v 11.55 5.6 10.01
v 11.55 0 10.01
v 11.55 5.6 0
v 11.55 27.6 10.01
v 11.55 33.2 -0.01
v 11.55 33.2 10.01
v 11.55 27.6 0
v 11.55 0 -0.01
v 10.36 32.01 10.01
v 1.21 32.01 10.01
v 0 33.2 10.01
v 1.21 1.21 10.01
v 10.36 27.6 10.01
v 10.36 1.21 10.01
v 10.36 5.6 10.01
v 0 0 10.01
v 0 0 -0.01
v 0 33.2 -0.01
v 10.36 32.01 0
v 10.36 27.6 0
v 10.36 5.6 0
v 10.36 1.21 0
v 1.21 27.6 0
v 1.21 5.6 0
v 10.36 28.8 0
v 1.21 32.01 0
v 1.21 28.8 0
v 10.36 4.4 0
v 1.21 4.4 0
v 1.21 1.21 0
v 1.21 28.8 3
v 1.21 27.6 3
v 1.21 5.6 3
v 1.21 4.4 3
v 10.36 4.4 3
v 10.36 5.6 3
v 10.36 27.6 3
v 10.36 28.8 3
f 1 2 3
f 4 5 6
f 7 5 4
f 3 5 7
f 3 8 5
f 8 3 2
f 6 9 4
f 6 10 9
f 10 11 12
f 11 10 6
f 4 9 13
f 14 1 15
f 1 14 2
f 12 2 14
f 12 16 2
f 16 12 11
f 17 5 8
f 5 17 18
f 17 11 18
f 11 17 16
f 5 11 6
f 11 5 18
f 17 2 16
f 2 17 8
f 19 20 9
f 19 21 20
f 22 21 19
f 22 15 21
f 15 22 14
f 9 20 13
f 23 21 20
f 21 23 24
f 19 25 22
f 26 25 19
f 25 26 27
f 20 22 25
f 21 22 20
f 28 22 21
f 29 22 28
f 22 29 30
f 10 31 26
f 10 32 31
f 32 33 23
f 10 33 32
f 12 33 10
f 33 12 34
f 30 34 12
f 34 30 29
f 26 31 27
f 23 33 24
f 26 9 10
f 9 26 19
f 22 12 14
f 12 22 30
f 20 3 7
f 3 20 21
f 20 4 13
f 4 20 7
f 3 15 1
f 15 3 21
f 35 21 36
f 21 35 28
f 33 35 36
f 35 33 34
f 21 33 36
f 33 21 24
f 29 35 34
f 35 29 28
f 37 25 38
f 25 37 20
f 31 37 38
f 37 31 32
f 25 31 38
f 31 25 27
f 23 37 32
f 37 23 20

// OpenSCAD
// file: ../Base/Rotation.scad
// Fischertechnik Box Foundation
// Geometry Helpers Rotation

include <PlacementOptions.scad>

// getRotatedSpace(space, rotation=NoRotation)
// Rotates the space dependent on the specified rotation

function getRotatedSpace(space, rotation=NoRotation) = [
    (rotation == Rotate90 || rotation == Rotate270) ? space.y : space.x,
    (rotation == Rotate90 || rotation == Rotate270) ? space.x : space.y
];

// Rotates the given space around the fixed left lower corner
// space = the space the children needs as width/depth list [width,depth]
// rotation = 0 Rotate0 degrees, 1 Rotate90 degrees, 2 Rotate180 degrees, 3 Rotate270 degrees (equivalent to -90)

module RotateFix(space, rotation=NoRotation) {
    dy = (rotation == Rotate0 || rotation == Rotate270) ? 0 :
        (rotation == Rotate90) ? space.x :
        space.y;
    dx = (rotation < Rotate180) ? 0 :
        (rotation == Rotate180) ? space.x :
        space.y;
    
    translate([dx, dy, 0])
        rotate([0, 0, rotations[rotation]])
            children();
}
// file: ../Base/Alignment.scad
// Fischertechnik Box Foundation
// Geometry Helpers Alignment

include <PlacementOptions.scad>

// getAlignedX(elementWidth, spaceWidth, align=AlignRight, offset=0)
// Gets the aligned X offset of an element with the given
// width in the given space.
// elementWidth = The width of the element to positon
// spaceWidth = The space where the element should be aligned
// align = 0 AlignLeft, 1 AlignCenter, 2 AlignRight
// offset = an optional offset from the aligned position. When
// aligned left or centered, then positive values are in X direction.
// When aligned right then positive values are in negative X direction.

function getAlignedX(elementWidth, spaceWidth, align=AlignRight, offset=0) =
    (align == AlignLeft) ?
        offset :
        ((align == AlignCenter) ?
        (spaceWidth - elementWidth)/2 + offset :
        spaceWidth - offset - elementWidth);

// getAlignedY(elementDepth, spaceDepth, align=AlignTop, offset=0)
// Gets the aligned Y offset of an element with the given
// depth in the given space.
// elementDepth = The depth of the element to positon
// spaceDepth = The space where the element should be aligned
// align = 0 AlignBottom, 1 AlignCenter, 2 AlignTop
// offset = an optional offset from the aligned position. When
// aligned bottom or centered, then positive values are in Y direction.
// When aligned top then positive values are in negative Y direction.

function getAlignedY(elementDepth, spaceDepth, align=AlignTop, offset=0) =
    (align == AlignBottom) ?
        offset :
        ((align == AlignCenter) ?
        (spaceDepth - elementDepth)/2 + offset :
        spaceDepth - offset - elementDepth);
// file: ../Base/PlacementOptions.scad
// Fischertechnik Box Foundation
// Placement Options

// Alignment
NoAlign = 0;
AlignLeft = 1;
AlignBottom = 2;
AlignCenter = 3;
AlignRight = 4;
AlignTop = 5;

// Element rotation degree steps
rotations = [0, -90, -180, -270];

// Rotation
NoRotation = 0;
Rotate0 = 0;
Rotate90 = 1;
Rotate180 = 2;
Rotate270 = 3;

// Docking (seen from above)
NoDock = -1;
DockLeft = 0;
DockTop = 1;
DockRight = 2;
DockCorner = 2;
DockBottom = 3;

// Web corners
LowerLeft = 0;
UpperLeft = 1;
UpperRight = 2;
LowerRight = 3;

// Web position relative to corner
LeftOfCorner = 0;
RightOfCorner = 1;
// file: ../Base/Boxes.scad
// Fischertechnik Box Foundation
// Pre-designed Boxes

use <Constants.scad>

include <PlacementOptions.scad>

box190Width = 190;
box190Depth = 130;
box130Width = 130;
box130Depth = 95;

// Values are from an original ec3 box
topBottomDifference = 1.5;
outerHeight = 40;
baseThickness = 1.8;
innerHeight = outerHeight - baseThickness;
stackExcess = 5.7;
radius = 3.5;
wallThickness = 1.5;
tolerance = 0.2;

boxWallThickness = wallThickness;
boxBaseThickness = baseThickness;
boxWebWidth = 3.0;

// getBoxWallThickness()
// Gets the wall thickness of a Fischertechnik Box
function getBoxWallThickness() = boxWallThickness;

// getBoxUsageHeight(height = 38.2)
// Gets the usable height of a Fischertechnik box
// height = Outer height of the box from the bottom to the upper edge.
function getBoxUsageHeight(height = outerHeight) = height - baseThickness - stackExcess;

// getBoxInnerHeight()
// Gets the inner height of a Fischertechnik box, including the stack excess
function getBoxInnerHeight() = innerHeight;

// getBoxBaseThickness()
// Gets the thickness of the Fischertechnik box base.
function getBoxBaseThickness() = boxBaseThickness;

// getBoxWebWidth()
// Gets the width of a box web
function getBoxWebWidth() = boxWebWidth;

// getBox190Space()
// Gets the usable inner space of a Box 190 as an x/y-list
function getBox190Space() = [
    box190Width - 2*getBoxWallThickness() - topBottomDifference, 
    box190Depth - 2*getBoxWallThickness() - topBottomDifference ];

// RoundedCornerPlate(width, depth, height, radius)
// Creates a body plate with rounded corners for a box. Used
// also to create the complete box with the hull module.
// width = Width of the plate
// depth = depth of the plate 
// height = thickness of the plate
// radius = radius of the rounded corner
module RoundedCornerPlate(width, depth, height, radius) {
    translate([radius, radius])
    hull() {
        w = width-2*radius;
        d = depth-2*radius;
        cube([w, d, height]);
        cylinder(height, r=radius, $fn=getFragments());
        translate([w, 0])
            cylinder(height, r=radius, $fn=getFragments());
        translate([w, d])
            cylinder(height, r=radius, $fn=getFragments());
        translate([0, d])
            cylinder(height, r=radius, $fn=getFragments());
    }
}

// BoxBase(width, depth)
// Creates an empty stackable Fischertechnik compatible box
// width = Outer width of the box (190, 130, ...)
// depth = Outer depth of the box (130, 95, ...)

module BoxBase(width, depth, height=outerHeight) {    
    thinPlate = 0.01;

    innerHeight = height - baseThickness;    
    
    module Body(tolerance=tolerance) {
        hull() {
            // Bottom with tolerance to fit into the original boxes when stacked
            translate([-wallThickness+tolerance, -wallThickness+tolerance, -baseThickness])
                RoundedCornerPlate(width-topBottomDifference-2*tolerance, depth-topBottomDifference-2*tolerance, thinPlate, radius);
            
            // Top
            translate([-wallThickness-topBottomDifference/2, -wallThickness-topBottomDifference/2, innerHeight-thinPlate])
                RoundedCornerPlate(width, depth, thinPlate, radius);
         }
    }

    module Cutoff() {
        hull() {
            coWidth = width - 2*wallThickness;
            coDepth = depth - 2*wallThickness;
            
            // Bottom
            RoundedCornerPlate(coWidth-topBottomDifference, coDepth-topBottomDifference, thinPlate, radius);

            // Top
            translate([-topBottomDifference/2, -topBottomDifference/2, innerHeight+thinPlate]) 
                RoundedCornerPlate(coWidth, coDepth, thinPlate, radius);
        }
    }
    
    difference() {        
        Body();
        Cutoff();
        stackOffset = innerHeight - stackExcess;
        translate([0, 0, stackOffset + baseThickness])
            Body(tolerance=0);
    }
}

// Creates the Fischertechnik empty box 130x190 mm and places it at position 0,0
// 190x130 are the outer sizes, the inner space is slightly smaller. Use getBox190Space() to get the inner sizes.
// The box is positioned that the usable inner space is at the 0,0,0 position.

module Box190() {
    BoxBase(box190Width, box190Depth);
}

// Gets the usable inner space of a Box 130 as an x/y-list
function getBox130Space() = [
    box130Width - 2*getBoxWallThickness() - topBottomDifference, 
    box130Depth - 2*getBoxWallThickness() - topBottomDifference ];

// Creates the Fischertechnik empty box 95x130 mm and places it at position 0,0
// 190x130 are the outer sizes, the inner space is slightly smaller. Use getBox190Space() to get the inner sizes.
// The box is positioned that the usable inner space is at the 0,0,0 position.

module Box130() {
    BoxBase(box130Width, box130Depth);
}

// Creates a web at the specified box walls
// corner 0 = LowerLeft, 1 = UpperLeft, 2 = UpperRight, 3 = LowerRight
// side 0 = LeftOfCorner, 1 = RightOfCorner
// distance = Distance in mm from the corner
// boxSpace = inner width and depth of the box (default: Box 190)
// webWidth = length of the web (default is 3 mms)
// webThickness = thickness of the web (default is 1 mm)
// height = Height of the web (standard is getBoxUsageHeight())
// sink = How much of the web is sunk into the wall

module BoxWeb(
    corner, 
    side, 
    distance, 
    boxSpace=getBox190Space(), 
    webWidth=getBoxWebWidth(), 
    webThickness=1.0, 
    height=getBoxUsageHeight(),
    sink = getBoxWallThickness()/2) {
    width = (corner % 2 == 0) ? 
            (side == LeftOfCorner ? webWidth : webThickness) :
            (side == LeftOfCorner ? webThickness : webWidth);

    depth = (corner % 2 == 0) ? 
            (side == RightOfCorner ? webWidth : webThickness) :
            (side == RightOfCorner ? webThickness : webWidth);
    
    xDiff = corner == LowerLeft ? 
                (side == LeftOfCorner ? -sink : distance) :
            (corner == UpperLeft ?                
                (side == LeftOfCorner ? distance : -sink) :
            (corner == UpperRight ?
                (side == LeftOfCorner ? boxSpace.x-webWidth+sink : boxSpace.x-distance-webThickness) :
                (side == LeftOfCorner ? boxSpace.x-distance-webThickness: boxSpace.x-webWidth+sink)));

    yDiff = corner == LowerLeft ? 
                (side == RightOfCorner ? -sink : distance) :
            (corner == UpperLeft ?
                (side == RightOfCorner ? boxSpace.y-distance-webThickness : boxSpace.y-webWidth+sink) :
            (corner == UpperRight ?
                (side == RightOfCorner ? boxSpace.y-webWidth+sink : boxSpace.y-distance-webThickness) :
                (side == RightOfCorner ? distance : -sink)));
    
    translate([xDiff, yDiff, -getExcess()])
        cube([width, depth, height + 2*getExcess()]);
}
// file: ../Base/Placement.scad
// Fischertechnik Box Foundation
// Geometry Helpers Placement

use <Constants.scad>
use <Alignment.scad>
use <Rotation.scad>
use <Boxes.scad>

include <PlacementOptions.scad>

// Place(x=0, y=0, elementSpace=[0,0], alignX=AlignLeft, alignY=AlignBottom, rotation=Rotate0, boxSpace=getBox190Space())
// Places the child at the specified position
// y = Y-Position. This is a relative position when an X aligment is specified.
// x = X-Position. This is a relative position when an Y aligment is specified.
// elementSpace = space of the element to be placed [x,y]
// alignX = -1=NoAlign, 0 AlignLeft, 1 AlignCenter, 3 AlignRight (elementSpace and boxSpace required!)
// alignY = -1=NoAlign, 2 AlignBottom, 1 AlignCenter, 4 AlignTop (elementSpace and boxSpace required!)
// rotation = 0 Rotate0 0 degrees, 1 Rotate90 90 degrees, 
// 2 Rotate180 180 degrees, 3 Rotate270 270 degrees (equivalent to -90)
// boxSpace = Inner space of the box where the placement occurs [x,y] - default is Box 190x130 inner space

module Place(x=0, y=0, elementSpace=[0,0], 
  alignX=AlignLeft, alignY=AlignBottom, 
  rotation=NoRotation, boxSpace=getBox190Space()) {

    module Position(x, y, space, rotation=Rotate0) {
        translate([x, y, 0])
            RotateFix(space, rotation)
                children();
    }

    space = getRotatedSpace(elementSpace, rotation);
    alignedX = getAlignedX(space.x, boxSpace.x, alignX, x);
    alignedY = getAlignedY(space.y, boxSpace.y, alignY, y);
    Position(alignedX, alignedY, elementSpace, rotation)
        children();
}

// Center(space=getBox130Space(), elementSpace=[0,0])
// space = Space where the children is centered. For cylinder use centered=true and no elementSpace.
// elementSpace = space of the element to be centered [x,y]

module Center(space=getBox190Space(), elementSpace=[0,0]) {
    Place(elementSpace=elementSpace, boxSpace=space, alignX=AlignCenter, alignY=AlignCenter)
        children();
}

// CenterHorizontal(width=0, y=0, offset=0, space=getBox130Space())
// width = Width of the element to be placed.
// y = Y position of the element
// offset = Offset from the center position (negative will be left of the center)
// space = Space where the element is placed

module CenterHorizontal(width=0, y=0, offset=0, space=getBox190Space()) {
    Place(x=offset, y=y, elementSpace=[width, 0], boxSpace=space, alignX=AlignCenter)
        children(0);
}

// CenterVertical(depth=0, x=0, offset=0, space=getBox130Space())
// depth = Depth of the element to be placed.
// x = X position of the element
// offset = Offset from the center position (negative will be down of the center)
// space = Space where the element is placed

module CenterVertical(depth=0, x=0, offset=0, space=getBox190Space()) {
    Place(x=x, y=offset, elementSpace=[0, depth], boxSpace=space, alignY=AlignCenter)
        children(0);
}

// getIsVertical(align)
// True if the specified alignment needs a vertical orientation for a divider (AlignRight, AlignLeft)

function getIsVertical(align) = (align == AlignRight || align == AlignLeft);

// getIsHorizontal(align)
// True if the specified alignment needs a horizontal orientation for a divider (AlignTop, AlignBottom)

function getIsHorizontal(align) = (align == AlignTop || align == AlignBottom);
// file: ../Base/Constants.scad
// Fischertechnik Box Foundation
// Constants

// Constant values necessary for multiple elements

// Base constants
dividerThickness = 1.2;
excess = 0.01;
fragments = 90;
tolerance = 0.8;

// Gets the thickness of a divider 
function getDividerThickness() = dividerThickness;

// Gets the excess that is used to merge walls into each other
function getExcess() = excess;

// Gets amount of fragments of a cylinder
function getFragments() = fragments;

// Gets the inner tolerance of a frame to each side
function getTolerance() = tolerance;


// Fischertechnik specific constants
axisDiameter = 4;
axisBottomDiameter = axisDiameter + 1;
axisTolerance = 0.2;

// Gets axis diameter of Fischertechnik axis
function getAxisDiameter() = axisDiameter;

// Gets axis diameter tolerance (subtracted for element axis)
function getAxisTolerance() = axisTolerance;

// Gets the axis diameter for standing axis
function getStandAxisDiameter() = getAxisDiameter() - getAxisTolerance();

// Gets axis bottom diameter for thicker part at the bottom
function getAxisBottomDiameter() = axisBottomDiameter;

pinHeight = 2.5;

// gets the height of a connecting pin
function getPinHeight() = pinHeight;

standardEdgeDistance = 2.5;
standardWebDistance = 11.5;
standardCornerLength = 15;

// gets the standard distance to the wall of the box for dockable frames with webs
function getStandardEdgeDistance() = standardEdgeDistance;

// gets the standard distance of each web to the corner of the dockable frame
function getStandardWebDistance() = standardWebDistance;

// gets the standard length of the corner walls of a dockable frame
function getStandardCornerLength() = standardCornerLength;

tubeWallFactor = 0.8;

// gets the wall thickness of a tube.
function getTubeWallThickness() = tubeWallFactor * getDividerThickness();

smallPartsFrameHeight = 20;

// gets the frame height for docked small parts boxes.
function getSmallPartsFrameHeight() = smallPartsFrameHeight;

hubRingDiameter = 19.5;
hubRingLevelDiameter = 21;

// gets the diameter of a tube matching the inner ring of a wheel
function getHubRingDiameter() = hubRingDiameter;

// gets the diameter of a hub tube with a thicker diameter
function getHubRingLevelDiameter() = hubRingLevelDiameter;
// main file
// Fischertechnik Box Library
// Coupling Bracket
// 38252

use <../Base/Constants.scad>
use <../ModelBase/Simple.scad>
use <../ModelBase/Complex.scad>

/* [Hidden] */
width = 9.15 - getTolerance();
depth = 30;
height = 10;

// getFrameCouplingBracketSpace()
// Gets the space the frame coupling bracket needs as width and depth (.x and .y as a list)

function getFrameCouplingBracketSpace() = getFrameOuterVolume([width, depth, height]);

// FrameCouplingBracket()
// Coupling Bracket
// 38252

module FrameCouplingBracket() {
    cutOffWidth = 2 * getDividerThickness();
    cutOffDepth = 22;
    cutOffHeight = height + 2*getExcess();
    
    innerVolume = getFrameInnerVolume([width, depth, height]);
    cutOffXOffset = innerVolume.x + 2*getExcess();
    cutoffYOffset = (innerVolume.y - cutOffDepth) / 2 + getDividerThickness();
    
    difference() {
        Frame(innerVolume, tolerance=0);
        translate([cutOffXOffset, cutoffYOffset, 0])
            cube([cutOffWidth, cutOffDepth, cutOffHeight]);
    }
    
    railWidth = innerVolume.x + 2*getExcess();
    railDepth = getDividerThickness();
    railHeight = 3 + getExcess();
    
    railXOffset = getDividerThickness() - getExcess();
    railYOffset1 = cutoffYOffset - getDividerThickness();
    railYOffset2 = cutoffYOffset + cutOffDepth;
    
    translate([railXOffset, 0, -getExcess()]) {
        translate([0, railYOffset1])
            cube([railWidth, railDepth, railHeight]);
        translate([0, railYOffset2])
            cube([railWidth, railDepth, railHeight]);
    }
}

// Test
color("lightgray")
FrameCouplingBracket();
